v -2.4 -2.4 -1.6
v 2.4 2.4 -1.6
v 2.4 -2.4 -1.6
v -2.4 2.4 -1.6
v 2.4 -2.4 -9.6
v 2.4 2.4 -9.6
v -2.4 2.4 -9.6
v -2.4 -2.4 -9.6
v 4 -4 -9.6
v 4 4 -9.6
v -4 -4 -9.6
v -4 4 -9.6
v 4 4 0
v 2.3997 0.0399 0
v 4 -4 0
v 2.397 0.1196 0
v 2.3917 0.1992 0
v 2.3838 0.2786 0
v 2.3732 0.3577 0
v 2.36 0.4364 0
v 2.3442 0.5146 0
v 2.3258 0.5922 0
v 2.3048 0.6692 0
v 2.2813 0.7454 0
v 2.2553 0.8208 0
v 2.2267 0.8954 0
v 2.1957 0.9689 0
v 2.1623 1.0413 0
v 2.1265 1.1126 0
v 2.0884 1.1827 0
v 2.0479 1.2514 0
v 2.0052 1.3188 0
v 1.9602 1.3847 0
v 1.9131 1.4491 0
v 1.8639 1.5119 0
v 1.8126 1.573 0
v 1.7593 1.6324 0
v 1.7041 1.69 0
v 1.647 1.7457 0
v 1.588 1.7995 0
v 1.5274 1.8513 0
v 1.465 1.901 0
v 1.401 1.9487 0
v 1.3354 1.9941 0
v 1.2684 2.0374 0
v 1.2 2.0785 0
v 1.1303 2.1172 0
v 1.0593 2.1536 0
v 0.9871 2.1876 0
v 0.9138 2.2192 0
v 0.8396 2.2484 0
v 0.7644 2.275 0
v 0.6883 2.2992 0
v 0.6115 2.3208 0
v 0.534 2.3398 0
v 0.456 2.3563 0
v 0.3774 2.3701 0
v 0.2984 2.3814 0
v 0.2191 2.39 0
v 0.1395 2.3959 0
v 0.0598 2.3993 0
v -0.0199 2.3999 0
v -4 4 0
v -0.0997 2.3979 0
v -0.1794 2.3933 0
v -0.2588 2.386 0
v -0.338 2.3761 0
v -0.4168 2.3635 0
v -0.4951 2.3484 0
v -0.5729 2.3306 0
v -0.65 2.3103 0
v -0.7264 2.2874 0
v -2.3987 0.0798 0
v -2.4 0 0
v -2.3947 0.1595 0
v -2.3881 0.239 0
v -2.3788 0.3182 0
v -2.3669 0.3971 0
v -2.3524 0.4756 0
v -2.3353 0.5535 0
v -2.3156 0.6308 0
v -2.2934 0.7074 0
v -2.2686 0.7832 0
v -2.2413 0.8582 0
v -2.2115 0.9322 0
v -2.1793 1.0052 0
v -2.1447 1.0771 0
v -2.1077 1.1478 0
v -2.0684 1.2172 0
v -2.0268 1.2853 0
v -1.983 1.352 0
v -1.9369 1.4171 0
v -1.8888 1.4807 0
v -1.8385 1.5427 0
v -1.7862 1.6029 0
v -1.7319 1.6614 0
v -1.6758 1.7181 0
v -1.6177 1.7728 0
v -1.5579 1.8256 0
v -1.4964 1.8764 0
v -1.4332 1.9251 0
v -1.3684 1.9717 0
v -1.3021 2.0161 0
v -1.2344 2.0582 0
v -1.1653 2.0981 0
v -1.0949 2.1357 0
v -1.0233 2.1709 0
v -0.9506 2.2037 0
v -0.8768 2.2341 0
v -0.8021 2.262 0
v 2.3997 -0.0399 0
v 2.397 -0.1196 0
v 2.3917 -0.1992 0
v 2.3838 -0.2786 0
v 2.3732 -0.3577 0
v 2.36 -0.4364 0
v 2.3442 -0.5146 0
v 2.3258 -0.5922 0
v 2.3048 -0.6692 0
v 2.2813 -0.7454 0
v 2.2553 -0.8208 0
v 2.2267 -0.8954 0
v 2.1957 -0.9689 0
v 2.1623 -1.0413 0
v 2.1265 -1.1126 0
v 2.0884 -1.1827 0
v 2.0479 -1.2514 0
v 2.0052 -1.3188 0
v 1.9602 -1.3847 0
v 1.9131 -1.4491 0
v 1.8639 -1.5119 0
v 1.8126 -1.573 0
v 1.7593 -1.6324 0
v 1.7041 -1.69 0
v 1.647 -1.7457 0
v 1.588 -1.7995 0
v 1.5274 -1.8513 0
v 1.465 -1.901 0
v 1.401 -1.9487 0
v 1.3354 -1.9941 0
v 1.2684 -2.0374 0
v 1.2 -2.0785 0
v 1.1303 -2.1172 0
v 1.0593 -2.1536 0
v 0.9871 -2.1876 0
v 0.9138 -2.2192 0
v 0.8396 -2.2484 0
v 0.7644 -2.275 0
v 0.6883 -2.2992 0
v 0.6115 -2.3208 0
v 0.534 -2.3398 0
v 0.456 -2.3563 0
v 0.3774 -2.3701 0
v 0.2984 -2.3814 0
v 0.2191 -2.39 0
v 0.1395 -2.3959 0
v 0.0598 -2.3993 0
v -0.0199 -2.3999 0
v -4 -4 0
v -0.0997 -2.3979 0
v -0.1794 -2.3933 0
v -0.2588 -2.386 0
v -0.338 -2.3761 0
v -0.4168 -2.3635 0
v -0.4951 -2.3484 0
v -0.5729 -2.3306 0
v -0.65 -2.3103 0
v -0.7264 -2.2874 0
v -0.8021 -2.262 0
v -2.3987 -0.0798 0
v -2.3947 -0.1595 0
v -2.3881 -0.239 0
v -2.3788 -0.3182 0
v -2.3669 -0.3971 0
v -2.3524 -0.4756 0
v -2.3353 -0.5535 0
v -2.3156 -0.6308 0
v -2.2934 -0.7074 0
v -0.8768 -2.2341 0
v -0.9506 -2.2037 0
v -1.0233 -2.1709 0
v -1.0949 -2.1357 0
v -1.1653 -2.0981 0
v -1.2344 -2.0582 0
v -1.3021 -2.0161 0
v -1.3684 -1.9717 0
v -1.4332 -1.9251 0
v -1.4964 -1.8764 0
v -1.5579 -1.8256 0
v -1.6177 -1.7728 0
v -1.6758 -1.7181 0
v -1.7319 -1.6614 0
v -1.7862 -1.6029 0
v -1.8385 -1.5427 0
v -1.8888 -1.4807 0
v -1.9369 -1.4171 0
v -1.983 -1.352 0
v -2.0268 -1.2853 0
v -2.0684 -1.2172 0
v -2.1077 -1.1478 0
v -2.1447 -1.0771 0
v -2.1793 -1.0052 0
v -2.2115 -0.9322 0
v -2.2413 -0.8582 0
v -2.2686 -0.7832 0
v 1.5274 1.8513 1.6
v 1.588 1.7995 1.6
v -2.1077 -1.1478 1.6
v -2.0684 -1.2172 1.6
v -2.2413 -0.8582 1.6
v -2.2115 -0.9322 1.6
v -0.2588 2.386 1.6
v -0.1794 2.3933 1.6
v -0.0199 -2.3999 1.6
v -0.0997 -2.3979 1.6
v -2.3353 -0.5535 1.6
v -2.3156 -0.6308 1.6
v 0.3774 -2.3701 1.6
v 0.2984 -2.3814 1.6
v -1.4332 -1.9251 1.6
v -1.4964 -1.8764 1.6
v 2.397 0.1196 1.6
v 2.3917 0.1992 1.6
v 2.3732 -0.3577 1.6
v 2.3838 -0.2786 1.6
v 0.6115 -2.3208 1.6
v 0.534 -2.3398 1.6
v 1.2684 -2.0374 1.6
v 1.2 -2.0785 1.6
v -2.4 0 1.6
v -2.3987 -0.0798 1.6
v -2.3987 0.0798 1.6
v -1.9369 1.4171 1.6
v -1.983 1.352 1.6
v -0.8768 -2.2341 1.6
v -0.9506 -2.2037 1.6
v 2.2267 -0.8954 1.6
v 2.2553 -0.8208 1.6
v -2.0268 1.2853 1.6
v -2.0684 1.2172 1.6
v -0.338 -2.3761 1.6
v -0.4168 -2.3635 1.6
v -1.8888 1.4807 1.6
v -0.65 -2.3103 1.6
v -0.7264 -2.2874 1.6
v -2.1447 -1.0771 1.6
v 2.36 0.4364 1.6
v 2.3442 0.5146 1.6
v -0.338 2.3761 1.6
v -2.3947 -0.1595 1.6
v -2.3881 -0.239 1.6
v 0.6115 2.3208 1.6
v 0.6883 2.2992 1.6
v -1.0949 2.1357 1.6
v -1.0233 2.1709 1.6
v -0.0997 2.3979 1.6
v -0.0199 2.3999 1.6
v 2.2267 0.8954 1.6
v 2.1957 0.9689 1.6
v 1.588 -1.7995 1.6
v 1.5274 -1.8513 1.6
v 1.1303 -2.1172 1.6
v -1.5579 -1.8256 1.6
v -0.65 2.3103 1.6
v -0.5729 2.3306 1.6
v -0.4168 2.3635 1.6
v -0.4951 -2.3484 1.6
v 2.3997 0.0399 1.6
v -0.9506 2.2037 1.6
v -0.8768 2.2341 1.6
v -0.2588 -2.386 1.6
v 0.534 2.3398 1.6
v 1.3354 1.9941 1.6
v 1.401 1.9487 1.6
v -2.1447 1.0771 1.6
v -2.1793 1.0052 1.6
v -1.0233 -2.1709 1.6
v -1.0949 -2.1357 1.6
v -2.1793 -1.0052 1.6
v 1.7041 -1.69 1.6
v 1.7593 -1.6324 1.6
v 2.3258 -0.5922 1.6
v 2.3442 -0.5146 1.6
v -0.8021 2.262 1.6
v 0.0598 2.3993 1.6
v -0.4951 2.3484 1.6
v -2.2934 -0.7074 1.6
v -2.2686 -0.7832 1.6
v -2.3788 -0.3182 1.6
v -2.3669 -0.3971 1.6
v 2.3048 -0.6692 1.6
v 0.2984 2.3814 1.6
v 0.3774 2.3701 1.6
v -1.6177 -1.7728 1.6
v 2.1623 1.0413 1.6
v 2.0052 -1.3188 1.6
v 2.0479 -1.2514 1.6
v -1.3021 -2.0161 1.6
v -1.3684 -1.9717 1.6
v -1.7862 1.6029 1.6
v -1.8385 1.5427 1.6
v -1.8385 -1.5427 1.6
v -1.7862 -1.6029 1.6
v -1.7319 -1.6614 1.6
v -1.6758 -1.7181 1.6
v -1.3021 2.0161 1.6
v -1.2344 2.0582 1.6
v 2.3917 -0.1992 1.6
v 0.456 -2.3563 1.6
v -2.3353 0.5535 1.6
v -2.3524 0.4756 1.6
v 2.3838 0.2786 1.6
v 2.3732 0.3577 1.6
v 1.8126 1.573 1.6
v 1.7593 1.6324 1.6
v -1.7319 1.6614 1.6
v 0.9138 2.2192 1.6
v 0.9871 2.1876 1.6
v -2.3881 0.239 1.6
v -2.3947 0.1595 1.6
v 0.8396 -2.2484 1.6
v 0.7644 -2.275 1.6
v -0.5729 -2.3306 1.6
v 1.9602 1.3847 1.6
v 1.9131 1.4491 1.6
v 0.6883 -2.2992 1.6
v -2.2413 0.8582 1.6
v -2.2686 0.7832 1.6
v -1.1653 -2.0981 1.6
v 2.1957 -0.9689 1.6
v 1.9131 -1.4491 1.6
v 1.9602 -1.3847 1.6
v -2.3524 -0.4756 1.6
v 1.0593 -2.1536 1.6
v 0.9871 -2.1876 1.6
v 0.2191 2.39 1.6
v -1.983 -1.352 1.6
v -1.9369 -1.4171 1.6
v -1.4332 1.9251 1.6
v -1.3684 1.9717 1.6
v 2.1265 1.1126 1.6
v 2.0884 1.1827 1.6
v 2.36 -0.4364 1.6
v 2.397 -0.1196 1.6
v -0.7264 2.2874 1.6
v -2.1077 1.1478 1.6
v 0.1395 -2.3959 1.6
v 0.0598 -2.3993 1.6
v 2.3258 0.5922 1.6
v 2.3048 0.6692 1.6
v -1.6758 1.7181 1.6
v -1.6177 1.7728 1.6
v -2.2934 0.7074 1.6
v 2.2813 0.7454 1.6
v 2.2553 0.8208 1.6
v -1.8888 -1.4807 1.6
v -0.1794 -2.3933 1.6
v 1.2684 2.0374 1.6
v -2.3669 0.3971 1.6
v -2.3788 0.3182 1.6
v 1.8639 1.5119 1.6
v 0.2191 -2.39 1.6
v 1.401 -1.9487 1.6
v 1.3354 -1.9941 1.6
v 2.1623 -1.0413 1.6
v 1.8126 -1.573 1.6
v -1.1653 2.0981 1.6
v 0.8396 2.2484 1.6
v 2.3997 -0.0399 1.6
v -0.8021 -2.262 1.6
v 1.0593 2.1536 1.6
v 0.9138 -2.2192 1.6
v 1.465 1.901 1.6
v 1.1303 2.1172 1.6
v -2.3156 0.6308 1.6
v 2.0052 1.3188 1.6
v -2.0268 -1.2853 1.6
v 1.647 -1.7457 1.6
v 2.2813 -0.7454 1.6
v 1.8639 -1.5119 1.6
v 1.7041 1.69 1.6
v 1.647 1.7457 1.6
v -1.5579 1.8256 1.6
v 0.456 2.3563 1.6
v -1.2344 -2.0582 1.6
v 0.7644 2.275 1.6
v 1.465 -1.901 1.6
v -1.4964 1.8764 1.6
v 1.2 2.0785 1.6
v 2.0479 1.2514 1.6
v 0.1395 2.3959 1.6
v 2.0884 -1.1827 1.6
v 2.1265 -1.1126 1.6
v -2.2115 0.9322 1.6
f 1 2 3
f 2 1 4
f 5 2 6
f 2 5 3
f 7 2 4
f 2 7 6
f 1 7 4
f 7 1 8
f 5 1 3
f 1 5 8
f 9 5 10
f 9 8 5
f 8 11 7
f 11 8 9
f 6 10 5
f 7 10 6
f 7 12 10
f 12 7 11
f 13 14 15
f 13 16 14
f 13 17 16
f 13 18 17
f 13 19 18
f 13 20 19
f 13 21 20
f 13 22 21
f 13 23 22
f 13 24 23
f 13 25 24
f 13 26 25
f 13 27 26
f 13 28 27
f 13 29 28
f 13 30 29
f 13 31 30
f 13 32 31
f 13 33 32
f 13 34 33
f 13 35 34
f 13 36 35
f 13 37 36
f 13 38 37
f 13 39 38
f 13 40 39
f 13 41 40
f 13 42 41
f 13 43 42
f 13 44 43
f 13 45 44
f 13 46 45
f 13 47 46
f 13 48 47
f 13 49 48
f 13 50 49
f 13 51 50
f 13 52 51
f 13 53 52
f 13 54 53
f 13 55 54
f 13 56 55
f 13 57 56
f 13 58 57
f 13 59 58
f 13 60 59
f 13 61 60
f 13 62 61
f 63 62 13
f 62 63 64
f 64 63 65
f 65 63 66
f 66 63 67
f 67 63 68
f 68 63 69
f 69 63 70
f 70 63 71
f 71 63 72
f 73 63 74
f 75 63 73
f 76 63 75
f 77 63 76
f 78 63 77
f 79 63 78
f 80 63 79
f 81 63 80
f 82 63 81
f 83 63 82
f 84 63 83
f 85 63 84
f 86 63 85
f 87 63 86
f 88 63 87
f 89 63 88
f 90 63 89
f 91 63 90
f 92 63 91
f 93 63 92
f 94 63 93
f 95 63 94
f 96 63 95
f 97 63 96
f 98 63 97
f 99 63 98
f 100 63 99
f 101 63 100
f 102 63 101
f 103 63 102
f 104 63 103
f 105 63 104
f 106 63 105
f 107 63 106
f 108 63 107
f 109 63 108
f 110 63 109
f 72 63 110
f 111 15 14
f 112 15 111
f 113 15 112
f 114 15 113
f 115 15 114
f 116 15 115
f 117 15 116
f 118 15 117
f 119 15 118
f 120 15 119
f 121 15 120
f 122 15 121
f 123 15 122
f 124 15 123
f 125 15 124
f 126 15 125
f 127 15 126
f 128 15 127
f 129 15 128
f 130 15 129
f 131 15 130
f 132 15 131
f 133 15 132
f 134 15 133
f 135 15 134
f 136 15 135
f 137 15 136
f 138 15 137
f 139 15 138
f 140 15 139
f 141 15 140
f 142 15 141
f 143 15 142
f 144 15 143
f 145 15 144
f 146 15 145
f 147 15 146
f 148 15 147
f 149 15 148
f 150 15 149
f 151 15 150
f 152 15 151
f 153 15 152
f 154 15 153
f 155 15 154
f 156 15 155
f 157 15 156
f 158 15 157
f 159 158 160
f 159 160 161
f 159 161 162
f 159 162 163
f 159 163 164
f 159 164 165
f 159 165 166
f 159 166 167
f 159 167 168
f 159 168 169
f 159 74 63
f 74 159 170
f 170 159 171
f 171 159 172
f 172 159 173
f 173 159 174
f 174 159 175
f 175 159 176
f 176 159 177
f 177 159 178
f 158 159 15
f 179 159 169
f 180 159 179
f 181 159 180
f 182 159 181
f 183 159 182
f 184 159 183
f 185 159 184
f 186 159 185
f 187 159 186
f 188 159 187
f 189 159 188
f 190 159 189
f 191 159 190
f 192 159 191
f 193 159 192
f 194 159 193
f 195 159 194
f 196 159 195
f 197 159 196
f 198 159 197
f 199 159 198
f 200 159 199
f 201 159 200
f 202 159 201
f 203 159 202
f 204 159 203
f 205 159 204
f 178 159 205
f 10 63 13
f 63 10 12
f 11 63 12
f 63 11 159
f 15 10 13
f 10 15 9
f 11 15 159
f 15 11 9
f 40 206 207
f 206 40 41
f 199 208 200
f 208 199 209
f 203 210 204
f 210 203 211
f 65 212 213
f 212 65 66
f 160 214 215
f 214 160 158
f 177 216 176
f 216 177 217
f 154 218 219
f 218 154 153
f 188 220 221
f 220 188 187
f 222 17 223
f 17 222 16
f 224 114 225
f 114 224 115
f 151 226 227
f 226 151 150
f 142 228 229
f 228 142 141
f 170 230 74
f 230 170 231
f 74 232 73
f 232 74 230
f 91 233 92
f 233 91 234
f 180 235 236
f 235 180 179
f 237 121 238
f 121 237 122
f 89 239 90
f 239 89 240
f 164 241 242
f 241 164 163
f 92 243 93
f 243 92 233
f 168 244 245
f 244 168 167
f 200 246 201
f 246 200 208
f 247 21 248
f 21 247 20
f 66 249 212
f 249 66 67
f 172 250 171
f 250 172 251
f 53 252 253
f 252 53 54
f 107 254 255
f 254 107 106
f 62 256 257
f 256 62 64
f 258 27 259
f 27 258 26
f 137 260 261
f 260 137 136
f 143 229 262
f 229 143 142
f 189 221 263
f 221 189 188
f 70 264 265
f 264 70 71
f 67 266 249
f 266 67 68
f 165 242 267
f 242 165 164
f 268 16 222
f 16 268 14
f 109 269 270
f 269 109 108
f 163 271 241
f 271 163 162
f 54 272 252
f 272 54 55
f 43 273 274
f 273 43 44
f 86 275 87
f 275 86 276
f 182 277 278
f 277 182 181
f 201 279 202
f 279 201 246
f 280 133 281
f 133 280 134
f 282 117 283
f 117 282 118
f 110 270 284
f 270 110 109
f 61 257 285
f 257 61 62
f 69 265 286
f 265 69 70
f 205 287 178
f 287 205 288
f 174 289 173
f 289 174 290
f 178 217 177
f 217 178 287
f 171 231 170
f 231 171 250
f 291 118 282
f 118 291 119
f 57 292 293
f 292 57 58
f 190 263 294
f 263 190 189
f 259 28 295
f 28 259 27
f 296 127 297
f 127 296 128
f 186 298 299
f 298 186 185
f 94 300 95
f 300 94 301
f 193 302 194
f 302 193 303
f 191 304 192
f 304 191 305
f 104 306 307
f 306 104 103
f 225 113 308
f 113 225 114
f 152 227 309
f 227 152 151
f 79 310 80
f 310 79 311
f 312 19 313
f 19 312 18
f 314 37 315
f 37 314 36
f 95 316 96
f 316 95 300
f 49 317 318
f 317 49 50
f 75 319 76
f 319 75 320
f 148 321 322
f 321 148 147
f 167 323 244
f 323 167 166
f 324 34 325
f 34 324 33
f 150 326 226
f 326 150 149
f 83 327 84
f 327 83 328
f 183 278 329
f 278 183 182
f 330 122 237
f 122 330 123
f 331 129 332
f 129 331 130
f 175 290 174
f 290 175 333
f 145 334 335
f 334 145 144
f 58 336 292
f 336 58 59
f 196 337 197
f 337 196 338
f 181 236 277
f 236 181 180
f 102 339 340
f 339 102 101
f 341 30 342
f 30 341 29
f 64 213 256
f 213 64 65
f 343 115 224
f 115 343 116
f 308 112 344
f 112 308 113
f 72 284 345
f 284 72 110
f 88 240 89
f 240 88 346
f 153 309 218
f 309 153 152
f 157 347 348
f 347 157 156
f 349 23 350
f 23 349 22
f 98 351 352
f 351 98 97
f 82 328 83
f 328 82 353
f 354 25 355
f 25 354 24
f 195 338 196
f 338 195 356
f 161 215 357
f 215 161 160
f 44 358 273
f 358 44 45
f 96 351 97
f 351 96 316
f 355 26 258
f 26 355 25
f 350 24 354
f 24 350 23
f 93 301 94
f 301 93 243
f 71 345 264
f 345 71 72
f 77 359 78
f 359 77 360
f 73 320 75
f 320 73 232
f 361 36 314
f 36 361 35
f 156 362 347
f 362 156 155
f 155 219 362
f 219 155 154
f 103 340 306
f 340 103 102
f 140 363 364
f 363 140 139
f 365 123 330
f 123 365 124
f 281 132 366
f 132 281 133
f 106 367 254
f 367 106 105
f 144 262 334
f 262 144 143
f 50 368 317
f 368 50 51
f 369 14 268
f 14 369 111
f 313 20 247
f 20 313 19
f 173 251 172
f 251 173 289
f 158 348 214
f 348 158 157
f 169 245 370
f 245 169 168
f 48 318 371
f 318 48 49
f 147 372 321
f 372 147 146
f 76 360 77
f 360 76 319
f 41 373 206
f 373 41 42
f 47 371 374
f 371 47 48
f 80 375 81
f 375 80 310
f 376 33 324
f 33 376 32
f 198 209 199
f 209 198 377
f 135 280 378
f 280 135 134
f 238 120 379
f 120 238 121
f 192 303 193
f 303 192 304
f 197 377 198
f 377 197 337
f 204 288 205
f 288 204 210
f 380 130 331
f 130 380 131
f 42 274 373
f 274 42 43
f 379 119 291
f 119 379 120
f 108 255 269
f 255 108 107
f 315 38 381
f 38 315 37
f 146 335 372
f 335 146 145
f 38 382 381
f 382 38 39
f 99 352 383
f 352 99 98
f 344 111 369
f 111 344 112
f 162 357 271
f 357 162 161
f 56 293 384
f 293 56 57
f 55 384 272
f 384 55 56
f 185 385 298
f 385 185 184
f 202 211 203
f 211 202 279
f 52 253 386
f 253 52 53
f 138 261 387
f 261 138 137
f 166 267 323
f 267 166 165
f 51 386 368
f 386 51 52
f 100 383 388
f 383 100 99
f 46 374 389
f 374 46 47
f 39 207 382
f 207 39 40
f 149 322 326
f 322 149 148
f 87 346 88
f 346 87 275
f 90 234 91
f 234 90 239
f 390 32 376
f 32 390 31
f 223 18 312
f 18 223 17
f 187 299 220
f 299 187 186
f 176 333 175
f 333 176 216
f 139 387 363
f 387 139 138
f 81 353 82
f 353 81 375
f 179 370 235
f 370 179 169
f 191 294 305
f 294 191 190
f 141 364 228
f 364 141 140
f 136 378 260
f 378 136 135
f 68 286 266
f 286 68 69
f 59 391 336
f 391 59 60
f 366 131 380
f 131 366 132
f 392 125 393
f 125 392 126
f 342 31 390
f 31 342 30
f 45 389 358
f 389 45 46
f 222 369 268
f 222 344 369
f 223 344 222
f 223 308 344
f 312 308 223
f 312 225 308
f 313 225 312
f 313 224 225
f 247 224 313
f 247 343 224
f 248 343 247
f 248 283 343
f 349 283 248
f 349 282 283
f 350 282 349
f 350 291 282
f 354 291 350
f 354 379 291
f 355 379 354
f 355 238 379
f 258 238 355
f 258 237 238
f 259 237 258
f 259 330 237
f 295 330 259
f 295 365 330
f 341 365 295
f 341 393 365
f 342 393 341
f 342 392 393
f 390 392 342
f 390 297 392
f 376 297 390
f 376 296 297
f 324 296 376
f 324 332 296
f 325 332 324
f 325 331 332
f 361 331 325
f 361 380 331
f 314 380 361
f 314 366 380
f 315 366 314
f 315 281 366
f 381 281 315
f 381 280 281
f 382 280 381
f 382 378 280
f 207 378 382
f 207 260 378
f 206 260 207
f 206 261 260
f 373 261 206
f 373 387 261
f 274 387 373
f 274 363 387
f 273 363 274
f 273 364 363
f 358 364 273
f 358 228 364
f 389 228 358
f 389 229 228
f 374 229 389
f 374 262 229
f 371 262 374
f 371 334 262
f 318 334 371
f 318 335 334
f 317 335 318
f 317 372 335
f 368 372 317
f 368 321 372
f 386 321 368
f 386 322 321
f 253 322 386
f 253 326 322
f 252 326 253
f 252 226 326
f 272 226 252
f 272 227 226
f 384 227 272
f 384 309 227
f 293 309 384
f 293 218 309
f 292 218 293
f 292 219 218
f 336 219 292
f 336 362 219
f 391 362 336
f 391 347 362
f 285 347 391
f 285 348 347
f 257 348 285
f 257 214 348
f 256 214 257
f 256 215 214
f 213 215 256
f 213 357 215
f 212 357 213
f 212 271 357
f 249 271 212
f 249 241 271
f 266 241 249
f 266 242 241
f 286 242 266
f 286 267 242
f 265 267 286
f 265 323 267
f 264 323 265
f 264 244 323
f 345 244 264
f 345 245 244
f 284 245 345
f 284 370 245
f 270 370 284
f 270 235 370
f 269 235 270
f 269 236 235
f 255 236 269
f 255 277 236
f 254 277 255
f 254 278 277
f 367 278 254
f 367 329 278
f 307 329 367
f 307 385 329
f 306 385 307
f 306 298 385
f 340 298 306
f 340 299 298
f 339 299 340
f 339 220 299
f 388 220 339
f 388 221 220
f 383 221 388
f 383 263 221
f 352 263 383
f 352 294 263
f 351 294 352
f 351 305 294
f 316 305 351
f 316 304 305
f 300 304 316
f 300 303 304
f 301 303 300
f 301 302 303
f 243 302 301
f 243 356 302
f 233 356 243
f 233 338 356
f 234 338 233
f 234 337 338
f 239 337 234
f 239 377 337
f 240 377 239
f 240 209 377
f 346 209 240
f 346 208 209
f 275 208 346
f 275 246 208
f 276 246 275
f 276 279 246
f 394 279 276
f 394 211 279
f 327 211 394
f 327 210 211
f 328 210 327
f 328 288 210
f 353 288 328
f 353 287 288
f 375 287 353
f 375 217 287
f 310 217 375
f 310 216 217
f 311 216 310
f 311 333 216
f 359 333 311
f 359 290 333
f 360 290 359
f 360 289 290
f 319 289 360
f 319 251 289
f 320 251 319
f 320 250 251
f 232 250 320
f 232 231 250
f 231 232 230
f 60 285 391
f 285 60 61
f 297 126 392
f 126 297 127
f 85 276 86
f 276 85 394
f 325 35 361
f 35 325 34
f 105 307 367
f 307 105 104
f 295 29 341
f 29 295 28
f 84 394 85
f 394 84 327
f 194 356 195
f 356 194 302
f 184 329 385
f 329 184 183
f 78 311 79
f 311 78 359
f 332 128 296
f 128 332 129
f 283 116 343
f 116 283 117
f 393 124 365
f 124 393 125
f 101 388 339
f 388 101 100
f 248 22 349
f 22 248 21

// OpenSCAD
// file: ../p/4-4edge.scad
use <../lib.scad>
$fa=1; $fs=0.2;
function ldraw_lib__4_4edge(realsolid=false) = [
// 0 Circle 1.0
// 0 Name: 4-4edge.dat
// 0 Author: James Jessiman
// 0 !LDRAW_ORG Primitive UPDATE 2017-01
// 0 !LICENSE Licensed under CC BY 2.0 and CC BY 4.0 : see CAreadme.txt
// 
// 0 BFC CERTIFY CCW
  [0,"BFC","CERTIFY"],
  [0,"BFC","CCW"],
// 
// 0 !HISTORY 1998-12-15 [PTadmin] Official Update 1998-10
// 0 !HISTORY 2005-12-28 [PTadmin] Official Update 2005-01
// 0 !HISTORY 2007-06-24 [PTadmin] Header formatted for Contributor Agreement
// 0 !HISTORY 2008-07-01 [PTadmin] Official Update 2008-01
// 0 !HISTORY 2017-01-15 [Steffen] BFCed
// 0 !HISTORY 2017-12-30 [PTadmin] Official Update 2017-01
// 
// 
// 2 24 1 0 0 0.9239 0 0.3827
  [2,24,1,0,0,0.9239,0,0.3827],
// 2 24 0.9239 0 0.3827 0.7071 0 0.7071
  [2,24,0.9239,0,0.3827,0.7071,0,0.7071],
// 2 24 0.7071 0 0.7071 0.3827 0 0.9239
  [2,24,0.7071,0,0.7071,0.3827,0,0.9239],
// 2 24 0.3827 0 0.9239 0 0 1
  [2,24,0.3827,0,0.9239,0,0,1],
// 2 24 0 0 1 -0.3827 0 0.9239
  [2,24,0,0,1,-0.3827,0,0.9239],
// 2 24 -0.3827 0 0.9239 -0.7071 0 0.7071
  [2,24,-0.3827,0,0.9239,-0.7071,0,0.7071],
// 2 24 -0.7071 0 0.7071 -0.9239 0 0.3827
  [2,24,-0.7071,0,0.7071,-0.9239,0,0.3827],
// 2 24 -0.9239 0 0.3827 -1 0 -0
  [2,24,-0.9239,0,0.3827,-1,0,-0],
// 2 24 -1 0 -0 -0.9239 0 -0.3827
  [2,24,-1,0,-0,-0.9239,0,-0.3827],
// 2 24 -0.9239 0 -0.3827 -0.7071 0 -0.7071
  [2,24,-0.9239,0,-0.3827,-0.7071,0,-0.7071],
// 2 24 -0.7071 0 -0.7071 -0.3827 0 -0.9239
  [2,24,-0.7071,0,-0.7071,-0.3827,0,-0.9239],
// 2 24 -0.3827 0 -0.9239 0 0 -1
  [2,24,-0.3827,0,-0.9239,0,0,-1],
// 2 24 0 0 -1 0.3827 0 -0.9239
  [2,24,0,0,-1,0.3827,0,-0.9239],
// 2 24 0.3827 0 -0.9239 0.7071 0 -0.7071
  [2,24,0.3827,0,-0.9239,0.7071,0,-0.7071],
// 2 24 0.7071 0 -0.7071 0.9239 0 -0.3827
  [2,24,0.7071,0,-0.7071,0.9239,0,-0.3827],
// 2 24 0.9239 0 -0.3827 1 0 0
  [2,24,0.9239,0,-0.3827,1,0,0],
];
module ldraw_lib__4_4edge(step=0, col=false, unit=2/5, alt=false, line=0.2, solid=!$preview)
    makepoly(ldraw_lib__4_4edge(solid), step=step, col=col, unit=unit, alt=alt, line=line, solid=solid);
ldraw_lib__4_4edge(line=0.2);
// file: ../p/4-4disc.scad
use <../lib.scad>
$fa=1; $fs=0.2;
function ldraw_lib__4_4disc(realsolid=false) = [
// 0 Disc 1.0
// 0 Name: 4-4disc.dat
// 0 Author: James Jessiman
// 0 !LDRAW_ORG Primitive UPDATE 2002-02
// 0 !LICENSE Licensed under CC BY 2.0 and CC BY 4.0 : see CAreadme.txt
// 
// 0 BFC CERTIFY CCW
  [0,"BFC","CERTIFY"],
  [0,"BFC","CCW"],
// 
// 0 !HISTORY 1998-12-15 [PTadmin] Official Update 1998-10
// 0 !HISTORY 2002-03-23 [sbliss] Added BFC statement
// 0 !HISTORY 2002-04-25 [PTadmin] Official Update 2002-02
// 0 !HISTORY 2007-06-24 [PTadmin] Header formatted for Contributor Agreement
// 0 !HISTORY 2008-07-01 [PTadmin] Official Update 2008-01
// 
// 
// 3 16 0 0 0 1 0 0 0.9239 0 0.3827
  [3,16,0,0,0,1,0,0,0.9239,0,0.3827],
// 3 16 0 0 0 0.9239 0 0.3827 0.7071 0 0.7071
  [3,16,0,0,0,0.9239,0,0.3827,0.7071,0,0.7071],
// 3 16 0 0 0 0.7071 0 0.7071 0.3827 0 0.9239
  [3,16,0,0,0,0.7071,0,0.7071,0.3827,0,0.9239],
// 3 16 0 0 0 0.3827 0 0.9239 0 0 1
  [3,16,0,0,0,0.3827,0,0.9239,0,0,1],
// 3 16 0 0 0 0 0 1 -0.3827 0 0.9239
  [3,16,0,0,0,0,0,1,-0.3827,0,0.9239],
// 3 16 0 0 0 -0.3827 0 0.9239 -0.7071 0 0.7071
  [3,16,0,0,0,-0.3827,0,0.9239,-0.7071,0,0.7071],
// 3 16 0 0 0 -0.7071 0 0.7071 -0.9239 0 0.3827
  [3,16,0,0,0,-0.7071,0,0.7071,-0.9239,0,0.3827],
// 3 16 0 0 0 -0.9239 0 0.3827 -1 0 -0
  [3,16,0,0,0,-0.9239,0,0.3827,-1,0,-0],
// 3 16 0 0 0 -1 0 -0 -0.9239 0 -0.3827
  [3,16,0,0,0,-1,0,-0,-0.9239,0,-0.3827],
// 3 16 0 0 0 -0.9239 0 -0.3827 -0.7071 0 -0.7071
  [3,16,0,0,0,-0.9239,0,-0.3827,-0.7071,0,-0.7071],
// 3 16 0 0 0 -0.7071 0 -0.7071 -0.3827 0 -0.9239
  [3,16,0,0,0,-0.7071,0,-0.7071,-0.3827,0,-0.9239],
// 3 16 0 0 0 -0.3827 0 -0.9239 0 0 -1
  [3,16,0,0,0,-0.3827,0,-0.9239,0,0,-1],
// 3 16 0 0 0 0 0 -1 0.3827 0 -0.9239
  [3,16,0,0,0,0,0,-1,0.3827,0,-0.9239],
// 3 16 0 0 0 0.3827 0 -0.9239 0.7071 0 -0.7071
  [3,16,0,0,0,0.3827,0,-0.9239,0.7071,0,-0.7071],
// 3 16 0 0 0 0.7071 0 -0.7071 0.9239 0 -0.3827
  [3,16,0,0,0,0.7071,0,-0.7071,0.9239,0,-0.3827],
// 3 16 0 0 0 0.9239 0 -0.3827 1 0 0
  [3,16,0,0,0,0.9239,0,-0.3827,1,0,0],
// 0
];
module ldraw_lib__4_4disc(step=0, col=false, unit=2/5, alt=false, line=0.2, solid=!$preview)
    makepoly(ldraw_lib__4_4disc(solid), step=step, col=col, unit=unit, alt=alt, line=line, solid=solid);
ldraw_lib__4_4disc(line=0.2);
// file: ../p/4-4cyli.scad
use <../lib.scad>
$fa=1; $fs=0.2;
function ldraw_lib__4_4cyli(realsolid=false) = [
// 0 Cylinder 1.0
// 0 Name: 4-4cyli.dat
// 0 Author: James Jessiman
// 0 !LDRAW_ORG Primitive UPDATE 2005-01
// 0 !LICENSE Licensed under CC BY 2.0 and CC BY 4.0 : see CAreadme.txt
// 
// 0 BFC CERTIFY CCW
  [0,"BFC","CERTIFY"],
  [0,"BFC","CCW"],
// 
// 0 !HISTORY 1998-12-15 [PTadmin] Official Update 1998-10
// 0 !HISTORY 2002-03-23 [sbliss] Added BFC statement; merged headers from files in distributions LDraw 0.27 and Complete.
// 0 !HISTORY 2002-04-25 [PTadmin] Official Update 2002-02
// 0 !HISTORY 2004-12-14 [guyvivan] BFC CCW
// 0 !HISTORY 2005-12-28 [PTadmin] Official Update 2005-01
// 0 !HISTORY 2007-06-24 [PTadmin] Header formatted for Contributor Agreement
// 0 !HISTORY 2008-07-01 [PTadmin] Official Update 2008-01
// 
// 
// 4 16 1 1 0 0.9239 1 0.3827 0.9239 0 0.3827 1 0 0
  [4,16,1,1,0,0.9239,1,0.3827,0.9239,0,0.3827,1,0,0],
// 5 24 1 0 0 1 1 0 0.9239 0 0.3827 0.9239 0 -0.3827
  [5,24,1,0,0,1,1,0,0.9239,0,0.3827,0.9239,0,-0.3827],
// 4 16 0.9239 1 0.3827 0.7071 1 0.7071 0.7071 0 0.7071 0.9239 0 0.3827
  [4,16,0.9239,1,0.3827,0.7071,1,0.7071,0.7071,0,0.7071,0.9239,0,0.3827],
// 5 24 0.9239 0 0.3827 0.9239 1 0.3827 0.7071 0 0.7071 1 0 0
  [5,24,0.9239,0,0.3827,0.9239,1,0.3827,0.7071,0,0.7071,1,0,0],
// 4 16 0.7071 1 0.7071 0.3827 1 0.9239 0.3827 0 0.9239 0.7071 0 0.7071
  [4,16,0.7071,1,0.7071,0.3827,1,0.9239,0.3827,0,0.9239,0.7071,0,0.7071],
// 5 24 0.7071 0 0.7071 0.7071 1 0.7071 0.3827 0 0.9239 0.9239 0 0.3827
  [5,24,0.7071,0,0.7071,0.7071,1,0.7071,0.3827,0,0.9239,0.9239,0,0.3827],
// 4 16 0.3827 1 0.9239 0 1 1 0 0 1 0.3827 0 0.9239
  [4,16,0.3827,1,0.9239,0,1,1,0,0,1,0.3827,0,0.9239],
// 5 24 0.3827 0 0.9239 0.3827 1 0.9239 0 0 1 0.7071 0 0.7071
  [5,24,0.3827,0,0.9239,0.3827,1,0.9239,0,0,1,0.7071,0,0.7071],
// 4 16 0 1 1 -0.3827 1 0.9239 -0.3827 0 0.9239 0 0 1
  [4,16,0,1,1,-0.3827,1,0.9239,-0.3827,0,0.9239,0,0,1],
// 5 24 0 0 1 0 1 1 -0.3827 0 0.9239 0.3827 0 0.9239
  [5,24,0,0,1,0,1,1,-0.3827,0,0.9239,0.3827,0,0.9239],
// 4 16 -0.3827 1 0.9239 -0.7071 1 0.7071 -0.7071 0 0.7071 -0.3827 0 0.9239
  [4,16,-0.3827,1,0.9239,-0.7071,1,0.7071,-0.7071,0,0.7071,-0.3827,0,0.9239],
// 5 24 -0.3827 0 0.9239 -0.3827 1 0.9239 -0.7071 0 0.7071 0 0 1
  [5,24,-0.3827,0,0.9239,-0.3827,1,0.9239,-0.7071,0,0.7071,0,0,1],
// 4 16 -0.7071 1 0.7071 -0.9239 1 0.3827 -0.9239 0 0.3827 -0.7071 0 0.7071
  [4,16,-0.7071,1,0.7071,-0.9239,1,0.3827,-0.9239,0,0.3827,-0.7071,0,0.7071],
// 5 24 -0.7071 0 0.7071 -0.7071 1 0.7071 -0.9239 0 0.3827 -0.3827 0 0.9239
  [5,24,-0.7071,0,0.7071,-0.7071,1,0.7071,-0.9239,0,0.3827,-0.3827,0,0.9239],
// 4 16 -0.9239 1 0.3827 -1 1 0 -1 0 0 -0.9239 0 0.3827
  [4,16,-0.9239,1,0.3827,-1,1,0,-1,0,0,-0.9239,0,0.3827],
// 5 24 -0.9239 0 0.3827 -0.9239 1 0.3827 -1 0 0 -0.7071 0 0.7071
  [5,24,-0.9239,0,0.3827,-0.9239,1,0.3827,-1,0,0,-0.7071,0,0.7071],
// 4 16 -1 1 0 -0.9239 1 -0.3827 -0.9239 0 -0.3827 -1 0 0
  [4,16,-1,1,0,-0.9239,1,-0.3827,-0.9239,0,-0.3827,-1,0,0],
// 5 24 -1 0 0 -1 1 0 -0.9239 0 -0.3827 -0.9239 0 0.3827
  [5,24,-1,0,0,-1,1,0,-0.9239,0,-0.3827,-0.9239,0,0.3827],
// 4 16 -0.9239 1 -0.3827 -0.7071 1 -0.7071 -0.7071 0 -0.7071 -0.9239 0 -0.3827
  [4,16,-0.9239,1,-0.3827,-0.7071,1,-0.7071,-0.7071,0,-0.7071,-0.9239,0,-0.3827],
// 5 24 -0.9239 0 -0.3827 -0.9239 1 -0.3827 -0.7071 0 -0.7071 -1 0 0
  [5,24,-0.9239,0,-0.3827,-0.9239,1,-0.3827,-0.7071,0,-0.7071,-1,0,0],
// 4 16 -0.7071 1 -0.7071 -0.3827 1 -0.9239 -0.3827 0 -0.9239 -0.7071 0 -0.7071
  [4,16,-0.7071,1,-0.7071,-0.3827,1,-0.9239,-0.3827,0,-0.9239,-0.7071,0,-0.7071],
// 5 24 -0.7071 0 -0.7071 -0.7071 1 -0.7071 -0.3827 0 -0.9239 -0.9239 0 -0.3827
  [5,24,-0.7071,0,-0.7071,-0.7071,1,-0.7071,-0.3827,0,-0.9239,-0.9239,0,-0.3827],
// 4 16 -0.3827 1 -0.9239 0 1 -1 0 0 -1 -0.3827 0 -0.9239
  [4,16,-0.3827,1,-0.9239,0,1,-1,0,0,-1,-0.3827,0,-0.9239],
// 5 24 -0.3827 0 -0.9239 -0.3827 1 -0.9239 0 0 -1 -0.7071 0 -0.7071
  [5,24,-0.3827,0,-0.9239,-0.3827,1,-0.9239,0,0,-1,-0.7071,0,-0.7071],
// 4 16 0 1 -1 0.3827 1 -0.9239 0.3827 0 -0.9239 0 0 -1
  [4,16,0,1,-1,0.3827,1,-0.9239,0.3827,0,-0.9239,0,0,-1],
// 5 24 0 0 -1 0 1 -1 0.3827 0 -0.9239 -0.3827 0 -0.9239
  [5,24,0,0,-1,0,1,-1,0.3827,0,-0.9239,-0.3827,0,-0.9239],
// 4 16 0.3827 1 -0.9239 0.7071 1 -0.7071 0.7071 0 -0.7071 0.3827 0 -0.9239
  [4,16,0.3827,1,-0.9239,0.7071,1,-0.7071,0.7071,0,-0.7071,0.3827,0,-0.9239],
// 5 24 0.3827 0 -0.9239 0.3827 1 -0.9239 0.7071 0 -0.7071 0 0 -1
  [5,24,0.3827,0,-0.9239,0.3827,1,-0.9239,0.7071,0,-0.7071,0,0,-1],
// 4 16 0.7071 1 -0.7071 0.9239 1 -0.3827 0.9239 0 -0.3827 0.7071 0 -0.7071
  [4,16,0.7071,1,-0.7071,0.9239,1,-0.3827,0.9239,0,-0.3827,0.7071,0,-0.7071],
// 5 24 0.7071 0 -0.7071 0.7071 1 -0.7071 0.9239 0 -0.3827 0.3827 0 -0.9239
  [5,24,0.7071,0,-0.7071,0.7071,1,-0.7071,0.9239,0,-0.3827,0.3827,0,-0.9239],
// 4 16 0.9239 1 -0.3827 1 1 0 1 0 0 0.9239 0 -0.3827
  [4,16,0.9239,1,-0.3827,1,1,0,1,0,0,0.9239,0,-0.3827],
// 5 24 0.9239 0 -0.3827 0.9239 1 -0.3827 1 0 0 0.7071 0 -0.7071
  [5,24,0.9239,0,-0.3827,0.9239,1,-0.3827,1,0,0,0.7071,0,-0.7071],
// 0
];
module ldraw_lib__4_4cyli(step=0, col=false, unit=2/5, alt=false, line=0.2, solid=!$preview)
    makepoly(ldraw_lib__4_4cyli(solid), step=step, col=col, unit=unit, alt=alt, line=line, solid=solid);
ldraw_lib__4_4cyli(line=0.2);
// file: ../p/stud3.scad
use <../lib.scad>
use <4-4cyli.scad>
use <4-4disc.scad>
use <4-4edge.scad>
$fa=1; $fs=0.2;
function ldraw_lib__stud3(realsolid=false) = realsolid ? 
    [openscad(translate([0,0,-eps()], o=cylinder(4+eps(), r=4)),2)] : [
// 0 Stud Tube Solid
// 0 Name: stud3.dat
// 0 Author: James Jessiman
// 0 !LDRAW_ORG Primitive UPDATE 2012-01
// 0 !LICENSE Licensed under CC BY 2.0 and CC BY 4.0 : see CAreadme.txt
// 
// 0 BFC CERTIFY CCW
  [0,"BFC","CERTIFY"],
  [0,"BFC","CCW"],
// 
// 0 !HISTORY 2002-04-04 [sbliss] Modified for BFC compliance
// 0 !HISTORY 2002-04-25 [PTadmin] Official Update 2002-02
// 0 !HISTORY 2007-06-24 [PTadmin] Header formatted for Contributor Agreement
// 0 !HISTORY 2008-07-01 [PTadmin] Official Update 2008-01
// 0 !HISTORY 2012-02-16 [Philo] Changed to CCW
// 0 !HISTORY 2012-03-30 [PTadmin] Official Update 2012-01
// 
// 
// 1 16 0 -4 0 4 0 0 0 1 0 0 0 4 4-4edge.dat
  [1,16,0,-4,0,4,0,0,0,1,0,0,0,4, ldraw_lib__4_4edge(realsolid)],
// 1 16 0 0 0 4 0 0 0 1 0 0 0 4 4-4edge.dat
  [1,16,0,0,0,4,0,0,0,1,0,0,0,4, ldraw_lib__4_4edge(realsolid)],
// 1 16 0 -4 0 4 0 0 0 1 0 0 0 4 4-4disc.dat
  [1,16,0,-4,0,4,0,0,0,1,0,0,0,4, ldraw_lib__4_4disc(realsolid)],
// 1 16 0 -4 0 4 0 0 0 4 0 0 0 4 4-4cyli.dat
  [1,16,0,-4,0,4,0,0,0,4,0,0,0,4, ldraw_lib__4_4cyli(realsolid)],
];
module ldraw_lib__stud3(step=0, col=false, unit=2/5, alt=false, line=0.2, solid=!$preview)
    makepoly(ldraw_lib__stud3(solid), step=step, col=col, unit=unit, alt=alt, line=line, solid=solid);
ldraw_lib__stud3(line=0.2);
// file: ../p/stud.scad
use <../lib.scad>
use <4-4cyli.scad>
use <4-4disc.scad>
use <4-4edge.scad>
$fa=1; $fs=0.2;
function ldraw_lib__stud(realsolid=false) = realsolid ? 
    [openscad(translate([0,0,-eps()], o=cylinder(4+eps(), r=6)),2)] : [
// 0 Stud
// 0 Name: stud.dat
// 0 Author: James Jessiman
// 0 !LDRAW_ORG Primitive UPDATE 2012-01
// 0 !LICENSE Licensed under CC BY 2.0 and CC BY 4.0 : see CAreadme.txt
// 
// 0 BFC CERTIFY CCW
  [0,"BFC","CERTIFY"],
  [0,"BFC","CCW"],
// 
// 0 !HISTORY 2002-04-04 [sbliss] Modified for BFC compliance
// 0 !HISTORY 2002-04-25 [PTadmin] Official Update 2002-02
// 0 !HISTORY 2007-06-24 [PTadmin] Header formatted for Contributor Agreement
// 0 !HISTORY 2008-07-01 [PTadmin] Official Update 2008-01
// 0 !HISTORY 2012-02-16 [Philo] Changed to CCW
// 0 !HISTORY 2012-03-30 [PTadmin] Official Update 2012-01
// 
// 
// 1 16 0 0 0 6 0 0 0 1 0 0 0 6 4-4edge.dat
  [1,16,0,0,0,6,0,0,0,1,0,0,0,6, ldraw_lib__4_4edge(realsolid)],
// 1 16 0 -4 0 6 0 0 0 1 0 0 0 6 4-4edge.dat
  [1,16,0,-4,0,6,0,0,0,1,0,0,0,6, ldraw_lib__4_4edge(realsolid)],
// 1 16 0 0 0 6 0 0 0 -4 0 0 0 6 4-4cyli.dat
  [1,16,0,0,0,6,0,0,0,-4,0,0,0,6, ldraw_lib__4_4cyli(realsolid)],
// 1 16 0 -4 0 6 0 0 0 1 0 0 0 6 4-4disc.dat
  [1,16,0,-4,0,6,0,0,0,1,0,0,0,6, ldraw_lib__4_4disc(realsolid)],
];
module ldraw_lib__stud(step=0, col=false, unit=2/5, alt=false, line=0.2, solid=!$preview)
    makepoly(ldraw_lib__stud(solid), step=step, col=col, unit=unit, alt=alt, line=line, solid=solid);
ldraw_lib__stud(line=0.2);
// file: ../p/box5.scad
use <../lib.scad>
$fa=1; $fs=0.2;
function ldraw_lib__box5(realsolid=false) = [
// 0 Box with 5 Faces and All Edges
// 0 Name: box5.dat
// 0 Author: James Jessiman
// 0 !LDRAW_ORG Primitive UPDATE 2012-01
// 0 !LICENSE Licensed under CC BY 2.0 and CC BY 4.0 : see CAreadme.txt
// 
// 0 BFC CERTIFY CCW
  [0,"BFC","CERTIFY"],
  [0,"BFC","CCW"],
// 
// 0 !HISTORY 2002-04-03 [sbliss] Modified for BFC compliance
// 0 !HISTORY 2002-04-25 [PTadmin] Official Update 2002-02
// 0 !HISTORY 2007-06-24 [PTadmin] Header formatted for Contributor Agreement
// 0 !HISTORY 2008-07-01 [PTadmin] Official Update 2008-01
// 0 !HISTORY 2012-02-16 [Philo] Changed to CCW
// 0 !HISTORY 2012-03-30 [PTadmin] Official Update 2012-01
// 
// 
// 2 24 1 1 1 -1 1 1
  [2,24,1,1,1,-1,1,1],
// 2 24 -1 1 1 -1 1 -1
  [2,24,-1,1,1,-1,1,-1],
// 2 24 -1 1 -1 1 1 -1
  [2,24,-1,1,-1,1,1,-1],
// 2 24 1 1 -1 1 1 1
  [2,24,1,1,-1,1,1,1],
// 2 24 1 0 1 -1 0 1
  [2,24,1,0,1,-1,0,1],
// 2 24 -1 0 1 -1 0 -1
  [2,24,-1,0,1,-1,0,-1],
// 2 24 -1 0 -1 1 0 -1
  [2,24,-1,0,-1,1,0,-1],
// 2 24 1 0 -1 1 0 1
  [2,24,1,0,-1,1,0,1],
// 2 24 1 0 1 1 1 1
  [2,24,1,0,1,1,1,1],
// 2 24 -1 0 1 -1 1 1
  [2,24,-1,0,1,-1,1,1],
// 2 24 1 0 -1 1 1 -1
  [2,24,1,0,-1,1,1,-1],
// 2 24 -1 0 -1 -1 1 -1
  [2,24,-1,0,-1,-1,1,-1],
// 4 16 -1 1 1 1 1 1 1 1 -1 -1 1 -1
  [4,16,-1,1,1,1,1,1,1,1,-1,-1,1,-1],
// 4 16 -1 1 1 -1 0 1 1 0 1 1 1 1
  [4,16,-1,1,1,-1,0,1,1,0,1,1,1,1],
// 4 16 -1 1 -1 -1 0 -1 -1 0 1 -1 1 1
  [4,16,-1,1,-1,-1,0,-1,-1,0,1,-1,1,1],
// 4 16 1 1 -1 1 0 -1 -1 0 -1 -1 1 -1
  [4,16,1,1,-1,1,0,-1,-1,0,-1,-1,1,-1],
// 4 16 1 1 1 1 0 1 1 0 -1 1 1 -1
  [4,16,1,1,1,1,0,1,1,0,-1,1,1,-1],
];
module ldraw_lib__box5(step=0, col=false, unit=2/5, alt=false, line=0.2, solid=!$preview)
    makepoly(ldraw_lib__box5(solid), step=step, col=col, unit=unit, alt=alt, line=line, solid=solid);
ldraw_lib__box5(line=0.2);
// file: ../p/box4t.scad
use <../lib.scad>
$fa=1; $fs=0.2;
function ldraw_lib__box4t(realsolid=false) = [
// 0 Box with 4 Adjacent Faces and All Edges
// 0 Name: box4t.dat
// 0 Author: Tore Eriksson [Tore_Eriksson]
// 0 !LDRAW_ORG Primitive UPDATE 2003-02
// 0 !LICENSE Licensed under CC BY 2.0 and CC BY 4.0 : see CAreadme.txt
// 
// 0 BFC CERTIFY CCW
  [0,"BFC","CERTIFY"],
  [0,"BFC","CCW"],
// 
// 0 !HISTORY 1997-09-29 [PTadmin] Official Update 1997-15
// 0 !HISTORY 2002-08-31 [izanette] Modified with WINDZ for BFC compliance
// 0 !HISTORY 2003-08-01 [PTadmin] Official Update 2003-02
// 0 !HISTORY 2007-06-24 [PTadmin] Header formatted for Contributor Agreement
// 0 !HISTORY 2008-07-01 [PTadmin] Official Update 2008-01
// 
// 
// 2 24 1 1 1 -1 1 1
  [2,24,1,1,1,-1,1,1],
// 2 24 -1 1 1 -1 1 -1
  [2,24,-1,1,1,-1,1,-1],
// 2 24 -1 1 -1 1 1 -1
  [2,24,-1,1,-1,1,1,-1],
// 2 24 1 1 -1 1 1 1
  [2,24,1,1,-1,1,1,1],
// 2 24 1 0 1 -1 0 1
  [2,24,1,0,1,-1,0,1],
// 2 24 -1 0 1 -1 0 -1
  [2,24,-1,0,1,-1,0,-1],
// 2 24 -1 0 -1 1 0 -1
  [2,24,-1,0,-1,1,0,-1],
// 2 24 1 0 -1 1 0 1
  [2,24,1,0,-1,1,0,1],
// 2 24 1 0 1 1 1 1
  [2,24,1,0,1,1,1,1],
// 2 24 -1 0 1 -1 1 1
  [2,24,-1,0,1,-1,1,1],
// 2 24 1 0 -1 1 1 -1
  [2,24,1,0,-1,1,1,-1],
// 2 24 -1 0 -1 -1 1 -1
  [2,24,-1,0,-1,-1,1,-1],
// 4 16 1 1 1 1 1 -1 -1 1 -1 -1 1 1
  [4,16,1,1,1,1,1,-1,-1,1,-1,-1,1,1],
// 4 16 1 1 1 -1 1 1 -1 0 1 1 0 1
  [4,16,1,1,1,-1,1,1,-1,0,1,1,0,1],
// 4 16 -1 1 1 -1 1 -1 -1 0 -1 -1 0 1
  [4,16,-1,1,1,-1,1,-1,-1,0,-1,-1,0,1],
// 0 4 16 -1 1 -1 -1 0 -1 1 0 -1 1 1 -1
// 4 16 1 1 -1 1 1 1 1 0 1 1 0 -1
  [4,16,1,1,-1,1,1,1,1,0,1,1,0,-1],
// 0
];
module ldraw_lib__box4t(step=0, col=false, unit=2/5, alt=false, line=0.2, solid=!$preview)
    makepoly(ldraw_lib__box4t(solid), step=step, col=col, unit=unit, alt=alt, line=line, solid=solid);
ldraw_lib__box4t(line=0.2);
// file: s/3004s01.scad
use <../../lib.scad>
use <../../p/box4t.scad>
use <../../p/box5.scad>
use <../../p/stud.scad>
use <../../p/stud3.scad>
$fa=1; $fs=0.2;
function ldraw_lib__s__3004s01(realsolid=false) = [
// 0 ~Brick  1 x  2 without Front Face
// 0 Name: s\3004s01.dat
// 0 Author: James Jessiman
// 0 !LDRAW_ORG Subpart UPDATE 2003-03
// 0 !LICENSE Licensed under CC BY 2.0 and CC BY 4.0 : see CAreadme.txt
// 
// 0 BFC CERTIFY CCW
  [0,"BFC","CERTIFY"],
  [0,"BFC","CCW"],
// 
// 0 !HISTORY 2003-09-07 [jriley] Subfiling, BFC
// 0 !HISTORY 2003-12-19 [PTadmin] Official Update 2003-03
// 0 !HISTORY 2007-08-29 [PTadmin] Header formatted for Contributor Agreement
// 0 !HISTORY 2008-07-01 [PTadmin] Official Update 2008-01
// 
// 
// 1 16 0 4 0 1 0 0 0 -5 0 0 0 1 stud3.dat
  [1,16,0,4,0,1,0,0,0,-5,0,0,0,1, ldraw_lib__stud3(realsolid)],
// 0 BFC INVERTNEXT
  [0,"BFC","INVERTNEXT"],
// 1 16 0 24 0 16 0 0 0 -20 0 0 0 6 box5.dat
  [1,16,0,24,0,16,0,0,0,-20,0,0,0,6, ldraw_lib__box5(realsolid)],
// 4 16 20 24 10 16 24 6 -16 24 6 -20 24 10
  [4,16,20,24,10,16,24,6,-16,24,6,-20,24,10],
// 4 16 -20 24 10 -16 24 6 -16 24 -6 -20 24 -10
  [4,16,-20,24,10,-16,24,6,-16,24,-6,-20,24,-10],
// 4 16 -20 24 -10 -16 24 -6 16 24 -6 20 24 -10
  [4,16,-20,24,-10,-16,24,-6,16,24,-6,20,24,-10],
// 4 16 20 24 -10 16 24 -6 16 24 6 20 24 10
  [4,16,20,24,-10,16,24,-6,16,24,6,20,24,10],
// 1 16 0 24 0 20 0 0 0 -24 0 0 0 10 box4t.dat
  [1,16,0,24,0,20,0,0,0,-24,0,0,0,10, ldraw_lib__box4t(realsolid)],
// 1 16 10 0 0 1 0 0 0 1 0 0 0 1 stud.dat
  [1,16,10,0,0,1,0,0,0,1,0,0,0,1, ldraw_lib__stud(realsolid)],
// 1 16 -10 0 0 1 0 0 0 1 0 0 0 1 stud.dat
  [1,16,-10,0,0,1,0,0,0,1,0,0,0,1, ldraw_lib__stud(realsolid)],
// 0
];
module ldraw_lib__s__3004s01(step=0, col=false, unit=2/5, alt=false, line=0.2, solid=!$preview)
    makepoly(ldraw_lib__s__3004s01(solid), step=step, col=col, unit=unit, alt=alt, line=line, solid=solid);
ldraw_lib__s__3004s01(line=0.2);
// file: s/3005s01.scad
use <../../lib.scad>
use <../../p/box4t.scad>
use <../../p/box5.scad>
use <../../p/stud.scad>
$fa=1; $fs=0.2;
function ldraw_lib__s__3005s01(realsolid=false) = [
// 0 ~Brick  1 x  1 without Front Face
// 0 Name: s\3005s01.dat
// 0 Author: John Riley [jriley]
// 0 !LDRAW_ORG Subpart UPDATE 2004-01
// 0 !LICENSE Licensed under CC BY 2.0 and CC BY 4.0 : see CAreadme.txt
// 
// 0 BFC CERTIFY CCW
  [0,"BFC","CERTIFY"],
  [0,"BFC","CCW"],
// 
// 0 !HISTORY 2003-09-07 [jriley] BFCed & Subfiled
// 0 !HISTORY 2004-03-02 [PTadmin] Official Update 2004-01
// 0 !HISTORY 2007-08-29 [PTadmin] Header formatted for Contributor Agreement
// 0 !HISTORY 2008-07-01 [PTadmin] Official Update 2008-01
// 
// 
// 0 BFC INVERTNEXT
  [0,"BFC","INVERTNEXT"],
// 1 16 0 24 0 0 0 6 0 -20 0 -6 0 0 box5.dat
  [1,16,0,24,0,0,0,6,0,-20,0,-6,0,0, ldraw_lib__box5(realsolid)],
// 4 16 10 24 -10 6 24 -6 6 24 6 10 24 10
  [4,16,10,24,-10,6,24,-6,6,24,6,10,24,10],
// 4 16 10 24 10 6 24 6 -6 24 6 -10 24 10
  [4,16,10,24,10,6,24,6,-6,24,6,-10,24,10],
// 4 16 -10 24 10 -6 24 6 -6 24 -6 -10 24 -10
  [4,16,-10,24,10,-6,24,6,-6,24,-6,-10,24,-10],
// 4 16 -10 24 -10 -6 24 -6 6 24 -6 10 24 -10
  [4,16,-10,24,-10,-6,24,-6,6,24,-6,10,24,-10],
// 1 16 0 24 0 10 0 0 0 -24 0 0 0 10 box4t.dat
  [1,16,0,24,0,10,0,0,0,-24,0,0,0,10, ldraw_lib__box4t(realsolid)],
// 1 16 0 0 0 0 0 1 0 1 0 -1 0 0 stud.dat
  [1,16,0,0,0,0,0,1,0,1,0,-1,0,0, ldraw_lib__stud(realsolid)],
// 0
];
module ldraw_lib__s__3005s01(step=0, col=false, unit=2/5, alt=false, line=0.2, solid=!$preview)
    makepoly(ldraw_lib__s__3005s01(solid), step=step, col=col, unit=unit, alt=alt, line=line, solid=solid);
ldraw_lib__s__3005s01(line=0.2);
// file: 3004.scad
use <../lib.scad>
use <s/3004s01.scad>
$fa=1; $fs=0.2;
function ldraw_lib__3004(realsolid=false) = [
// 0 Brick  1 x  2
// 0 Name: 3004.dat
// 0 Author: James Jessiman
// 0 !LDRAW_ORG Part UPDATE 2022-05
// 0 !LICENSE Licensed under CC BY 2.0 and CC BY 4.0 : see CAreadme.txt
// 
// 0 BFC CERTIFY CCW
  [0,"BFC","CERTIFY"],
  [0,"BFC","CCW"],
// 
// 0 !HISTORY 2001-10-26 [PTadmin] Official Update 2001-01
// 0 !HISTORY 2002-05-07 {unknown} BFC Certification
// 0 !HISTORY 2002-06-11 [PTadmin] Official Update 2002-03
// 0 !HISTORY 2007-05-07 [PTadmin] Header formatted for Contributor Agreement
// 0 !HISTORY 2008-07-01 [PTadmin] Official Update 2008-01
// 0 !HISTORY 2022-08-04 [MagFors] Using subfile
// 0 !HISTORY 2022-09-15 [PTadmin] Official Update 2022-05
// 
// 
// 1 16 0 0 0 1 0 0 0 1 0 0 0 1 s\3004s01.dat
  [1,16,0,0,0,1,0,0,0,1,0,0,0,1, ldraw_lib__s__3004s01(realsolid)],
// 4 16 -20 24 -10 20 24 -10 20 0 -10 -20 0 -10
  [4,16,-20,24,-10,20,24,-10,20,0,-10,-20,0,-10],
];
module ldraw_lib__3004(step=0, col=false, unit=2/5, alt=false, line=0.2, solid=!$preview)
    makepoly(ldraw_lib__3004(solid), step=step, col=col, unit=unit, alt=alt, line=line, solid=solid);
ldraw_lib__3004(line=0.2);
// file: 3005pt5.scad
use <../lib.scad>
use <s/3005s01.scad>
$fa=1; $fs=0.2;
function ldraw_lib__3005pt5(realsolid=false) = [
// 0 Brick  1 x  1 with Blue "5" Pattern
// 0 Name: 3005pt5.dat
// 0 Author: Tore Eriksson [Tore_Eriksson]
// 0 !LDRAW_ORG Part UPDATE 2004-03
// 0 !LICENSE Licensed under CC BY 2.0 and CC BY 4.0 : see CAreadme.txt
// 
// 0 BFC CERTIFY CW
  [0,"BFC","CERTIFY"],
  [0,"BFC","CW"],
// 
// 0 !HISTORY 2003-12-09 [Steffen] made use of existing subfile
// 0 !HISTORY 2004-09-15 [PTadmin] Official Update 2004-03
// 0 !HISTORY 2007-05-11 [PTadmin] Header formatted for Contributor Agreement
// 0 !HISTORY 2008-07-01 [PTadmin] Official Update 2008-01
// 
// 
// 1 16 0 0 0 1 0 0 0 1 0 0 0 1 s\3005s01.dat
  [1,16,0,0,0,1,0,0,0,1,0,0,0,1, ldraw_lib__s__3005s01(realsolid)],
// 4 1 -2.6 7.75 -10 -4.25 6.3 -10 3.95 6.3 -10 3.9 7.95 -10
  [4,1,-2.6,7.75,-10,-4.25,6.3,-10,3.95,6.3,-10,3.9,7.95,-10],
// 4 1 -2.75 10.2 -10 -4.25 9.95 -10 -4.25 6.3 -10 -2.6 7.75 -10
  [4,1,-2.75,10.2,-10,-4.25,9.95,-10,-4.25,6.3,-10,-2.6,7.75,-10],
// 4 1 -2 12 -10 -3.45 12.3 -10 -4.25 9.95 -10 -2.75 10.2 -10
  [4,1,-2,12,-10,-3.45,12.3,-10,-4.25,9.95,-10,-2.75,10.2,-10],
// 4 1 -1 11.8 -10 -2 12 -10 -2.75 10.2 -10 -1.1 10 -10
  [4,1,-1,11.8,-10,-2,12,-10,-2.75,10.2,-10,-1.1,10,-10],
// 4 1 1.6 10.1 -10 1.15 11.95 -10 -1 11.8 -10 -1.1 10 -10
  [4,1,1.6,10.1,-10,1.15,11.95,-10,-1,11.8,-10,-1.1,10,-10],
// 4 1 3.55 11.35 -10 1.95 12.5 -10 1.15 11.95 -10 1.6 10.1 -10
  [4,1,3.55,11.35,-10,1.95,12.5,-10,1.15,11.95,-10,1.6,10.1,-10],
// 4 1 4.2 13 -10 2.35 13.2 -10 1.95 12.5 -10 3.55 11.35 -10
  [4,1,4.2,13,-10,2.35,13.2,-10,1.95,12.5,-10,3.55,11.35,-10],
// 4 1 4 15 -10 1.75 14.7 -10 2.35 13.2 -10 4.2 13 -10
  [4,1,4,15,-10,1.75,14.7,-10,2.35,13.2,-10,4.2,13,-10],
// 4 1 2.4 16.5 -10 1.1 15.2 -10 1.75 14.7 -10 4 15 -10
  [4,1,2.4,16.5,-10,1.1,15.2,-10,1.75,14.7,-10,4,15,-10],
// 4 1 0.7 16.85 -10 -0.7 15.55 -10 1.1 15.2 -10 2.4 16.5 -10
  [4,1,0.7,16.85,-10,-0.7,15.55,-10,1.1,15.2,-10,2.4,16.5,-10],
// 4 1 -2 16.85 -10 -2.1 15.35 -10 -0.7 15.55 -10 0.7 16.85 -10
  [4,1,-2,16.85,-10,-2.1,15.35,-10,-0.7,15.55,-10,0.7,16.85,-10],
// 4 1 -3.5 16.55 -10 -3.4 15 -10 -2.1 15.35 -10 -2 16.85 -10
  [4,1,-3.5,16.55,-10,-3.4,15,-10,-2.1,15.35,-10,-2,16.85,-10],
// 4 1 -5.35 15.9 -10 -4.2 14.35 -10 -3.4 15 -10 -3.5 16.55 -10
  [4,1,-5.35,15.9,-10,-4.2,14.35,-10,-3.4,15,-10,-3.5,16.55,-10],
// 4 16 -4.25 9.95 -10 -3.45 12.3 -10 -4.2 14.35 -10 -5.35 15.9 -10
  [4,16,-4.25,9.95,-10,-3.45,12.3,-10,-4.2,14.35,-10,-5.35,15.9,-10],
// 4 16 -3.45 12.3 -10 -2 12 -10 -3.4 15 -10 -4.2 14.35 -10
  [4,16,-3.45,12.3,-10,-2,12,-10,-3.4,15,-10,-4.2,14.35,-10],
// 4 16 -3.4 15 -10 -2 12 -10 -1 11.8 -10 -2.1 15.35 -10
  [4,16,-3.4,15,-10,-2,12,-10,-1,11.8,-10,-2.1,15.35,-10],
// 4 16 -1 11.8 -10 1.15 11.95 -10 -0.7 15.55 -10 -2.1 15.35 -10
  [4,16,-1,11.8,-10,1.15,11.95,-10,-0.7,15.55,-10,-2.1,15.35,-10],
// 4 16 1.15 11.95 -10 1.95 12.5 -10 1.1 15.2 -10 -0.7 15.55 -10
  [4,16,1.15,11.95,-10,1.95,12.5,-10,1.1,15.2,-10,-0.7,15.55,-10],
// 4 16 1.95 12.5 -10 2.35 13.2 -10 1.75 14.7 -10 1.1 15.2 -10
  [4,16,1.95,12.5,-10,2.35,13.2,-10,1.75,14.7,-10,1.1,15.2,-10],
// 3 16 4.2 13 -10 3.55 11.35 -10 3.9 7.95 -10
  [3,16,4.2,13,-10,3.55,11.35,-10,3.9,7.95,-10],
// 3 16 3.55 11.35 -10 1.6 10.1 -10 3.9 7.95 -10
  [3,16,3.55,11.35,-10,1.6,10.1,-10,3.9,7.95,-10],
// 4 16 1.6 10.1 -10 -1.1 10 -10 -2.6 7.75 -10 3.9 7.95 -10
  [4,16,1.6,10.1,-10,-1.1,10,-10,-2.6,7.75,-10,3.9,7.95,-10],
// 3 16 -1.1 10 -10 -2.75 10.2 -10 -2.6 7.75 -10
  [3,16,-1.1,10,-10,-2.75,10.2,-10,-2.6,7.75,-10],
// 4 16 10 0 -10 3.95 6.3 -10 -4.25 6.3 -10 -10 0 -10
  [4,16,10,0,-10,3.95,6.3,-10,-4.25,6.3,-10,-10,0,-10],
// 3 16 -10 0 -10 -4.25 6.3 -10 -4.25 9.95 -10
  [3,16,-10,0,-10,-4.25,6.3,-10,-4.25,9.95,-10],
// 4 16 -10 0 -10 -4.25 9.95 -10 -5.35 15.9 -10 -10 24 -10
  [4,16,-10,0,-10,-4.25,9.95,-10,-5.35,15.9,-10,-10,24,-10],
// 3 16 -10 24 -10 -5.35 15.9 -10 -3.5 16.55 -10
  [3,16,-10,24,-10,-5.35,15.9,-10,-3.5,16.55,-10],
// 3 16 -10 24 -10 -3.5 16.55 -10 -2 16.85 -10
  [3,16,-10,24,-10,-3.5,16.55,-10,-2,16.85,-10],
// 4 16 -10 24 -10 -2 16.85 -10 0.7 16.85 -10 10 24 -10
  [4,16,-10,24,-10,-2,16.85,-10,0.7,16.85,-10,10,24,-10],
// 3 16 10 24 -10 0.7 16.85 -10 2.4 16.5 -10
  [3,16,10,24,-10,0.7,16.85,-10,2.4,16.5,-10],
// 3 16 10 24 -10 2.4 16.5 -10 4 15 -10
  [3,16,10,24,-10,2.4,16.5,-10,4,15,-10],
// 4 16 10 24 -10 4 15 -10 4.2 13 -10 10 0 -10
  [4,16,10,24,-10,4,15,-10,4.2,13,-10,10,0,-10],
// 3 16 10 0 -10 4.2 13 -10 3.9 7.95 -10
  [3,16,10,0,-10,4.2,13,-10,3.9,7.95,-10],
// 3 16 10 0 -10 3.9 7.95 -10 3.95 6.3 -10
  [3,16,10,0,-10,3.9,7.95,-10,3.95,6.3,-10],
// 0
];
module ldraw_lib__3005pt5(step=0, col=false, unit=2/5, alt=false, line=0.2, solid=!$preview)
    makepoly(ldraw_lib__3005pt5(solid), step=step, col=col, unit=unit, alt=alt, line=line, solid=solid);
ldraw_lib__3005pt5(line=0.2);
// main file
use <../lib.scad>
use <3005pt5.scad>
$fa=1; $fs=0.2;
function ldraw_lib__3005_5(realsolid=false) = [
// 0 ~Moved to 3005pt5
// 0 Name: 3005-5.dat
// 0 Author: [PTadmin]
// 0 !LDRAW_ORG Part UPDATE 2004-03
// 0 !LICENSE Licensed under CC BY 4.0 : see CAreadme.txt
// 
// 0 BFC CERTIFY CCW
  [0,"BFC","CERTIFY"],
  [0,"BFC","CCW"],
// 
// 0 !HISTORY 1998-12-15 [PTadmin] Official Update 1998-10
// 0 !HISTORY 2004-09-15 [PTadmin] Official Update 2004-03
// 0 !HISTORY 2007-05-11 [PTadmin] Header formatted for Contributor Agreement
// 0 !HISTORY 2008-07-01 [PTadmin] Official Update 2008-01
// 
// 
// 1 16 0 0 0 1 0 0 0 1 0 0 0 1 3005pt5.dat
  [1,16,0,0,0,1,0,0,0,1,0,0,0,1, ldraw_lib__3005pt5(realsolid)],
];
module ldraw_lib__3005_5(step=0, col=false, unit=2/5, alt=false, line=0.2, solid=!$preview)
    makepoly(ldraw_lib__3005_5(solid), step=step, col=col, unit=unit, alt=alt, line=line, solid=solid);
ldraw_lib__3005_5(line=0.2);
